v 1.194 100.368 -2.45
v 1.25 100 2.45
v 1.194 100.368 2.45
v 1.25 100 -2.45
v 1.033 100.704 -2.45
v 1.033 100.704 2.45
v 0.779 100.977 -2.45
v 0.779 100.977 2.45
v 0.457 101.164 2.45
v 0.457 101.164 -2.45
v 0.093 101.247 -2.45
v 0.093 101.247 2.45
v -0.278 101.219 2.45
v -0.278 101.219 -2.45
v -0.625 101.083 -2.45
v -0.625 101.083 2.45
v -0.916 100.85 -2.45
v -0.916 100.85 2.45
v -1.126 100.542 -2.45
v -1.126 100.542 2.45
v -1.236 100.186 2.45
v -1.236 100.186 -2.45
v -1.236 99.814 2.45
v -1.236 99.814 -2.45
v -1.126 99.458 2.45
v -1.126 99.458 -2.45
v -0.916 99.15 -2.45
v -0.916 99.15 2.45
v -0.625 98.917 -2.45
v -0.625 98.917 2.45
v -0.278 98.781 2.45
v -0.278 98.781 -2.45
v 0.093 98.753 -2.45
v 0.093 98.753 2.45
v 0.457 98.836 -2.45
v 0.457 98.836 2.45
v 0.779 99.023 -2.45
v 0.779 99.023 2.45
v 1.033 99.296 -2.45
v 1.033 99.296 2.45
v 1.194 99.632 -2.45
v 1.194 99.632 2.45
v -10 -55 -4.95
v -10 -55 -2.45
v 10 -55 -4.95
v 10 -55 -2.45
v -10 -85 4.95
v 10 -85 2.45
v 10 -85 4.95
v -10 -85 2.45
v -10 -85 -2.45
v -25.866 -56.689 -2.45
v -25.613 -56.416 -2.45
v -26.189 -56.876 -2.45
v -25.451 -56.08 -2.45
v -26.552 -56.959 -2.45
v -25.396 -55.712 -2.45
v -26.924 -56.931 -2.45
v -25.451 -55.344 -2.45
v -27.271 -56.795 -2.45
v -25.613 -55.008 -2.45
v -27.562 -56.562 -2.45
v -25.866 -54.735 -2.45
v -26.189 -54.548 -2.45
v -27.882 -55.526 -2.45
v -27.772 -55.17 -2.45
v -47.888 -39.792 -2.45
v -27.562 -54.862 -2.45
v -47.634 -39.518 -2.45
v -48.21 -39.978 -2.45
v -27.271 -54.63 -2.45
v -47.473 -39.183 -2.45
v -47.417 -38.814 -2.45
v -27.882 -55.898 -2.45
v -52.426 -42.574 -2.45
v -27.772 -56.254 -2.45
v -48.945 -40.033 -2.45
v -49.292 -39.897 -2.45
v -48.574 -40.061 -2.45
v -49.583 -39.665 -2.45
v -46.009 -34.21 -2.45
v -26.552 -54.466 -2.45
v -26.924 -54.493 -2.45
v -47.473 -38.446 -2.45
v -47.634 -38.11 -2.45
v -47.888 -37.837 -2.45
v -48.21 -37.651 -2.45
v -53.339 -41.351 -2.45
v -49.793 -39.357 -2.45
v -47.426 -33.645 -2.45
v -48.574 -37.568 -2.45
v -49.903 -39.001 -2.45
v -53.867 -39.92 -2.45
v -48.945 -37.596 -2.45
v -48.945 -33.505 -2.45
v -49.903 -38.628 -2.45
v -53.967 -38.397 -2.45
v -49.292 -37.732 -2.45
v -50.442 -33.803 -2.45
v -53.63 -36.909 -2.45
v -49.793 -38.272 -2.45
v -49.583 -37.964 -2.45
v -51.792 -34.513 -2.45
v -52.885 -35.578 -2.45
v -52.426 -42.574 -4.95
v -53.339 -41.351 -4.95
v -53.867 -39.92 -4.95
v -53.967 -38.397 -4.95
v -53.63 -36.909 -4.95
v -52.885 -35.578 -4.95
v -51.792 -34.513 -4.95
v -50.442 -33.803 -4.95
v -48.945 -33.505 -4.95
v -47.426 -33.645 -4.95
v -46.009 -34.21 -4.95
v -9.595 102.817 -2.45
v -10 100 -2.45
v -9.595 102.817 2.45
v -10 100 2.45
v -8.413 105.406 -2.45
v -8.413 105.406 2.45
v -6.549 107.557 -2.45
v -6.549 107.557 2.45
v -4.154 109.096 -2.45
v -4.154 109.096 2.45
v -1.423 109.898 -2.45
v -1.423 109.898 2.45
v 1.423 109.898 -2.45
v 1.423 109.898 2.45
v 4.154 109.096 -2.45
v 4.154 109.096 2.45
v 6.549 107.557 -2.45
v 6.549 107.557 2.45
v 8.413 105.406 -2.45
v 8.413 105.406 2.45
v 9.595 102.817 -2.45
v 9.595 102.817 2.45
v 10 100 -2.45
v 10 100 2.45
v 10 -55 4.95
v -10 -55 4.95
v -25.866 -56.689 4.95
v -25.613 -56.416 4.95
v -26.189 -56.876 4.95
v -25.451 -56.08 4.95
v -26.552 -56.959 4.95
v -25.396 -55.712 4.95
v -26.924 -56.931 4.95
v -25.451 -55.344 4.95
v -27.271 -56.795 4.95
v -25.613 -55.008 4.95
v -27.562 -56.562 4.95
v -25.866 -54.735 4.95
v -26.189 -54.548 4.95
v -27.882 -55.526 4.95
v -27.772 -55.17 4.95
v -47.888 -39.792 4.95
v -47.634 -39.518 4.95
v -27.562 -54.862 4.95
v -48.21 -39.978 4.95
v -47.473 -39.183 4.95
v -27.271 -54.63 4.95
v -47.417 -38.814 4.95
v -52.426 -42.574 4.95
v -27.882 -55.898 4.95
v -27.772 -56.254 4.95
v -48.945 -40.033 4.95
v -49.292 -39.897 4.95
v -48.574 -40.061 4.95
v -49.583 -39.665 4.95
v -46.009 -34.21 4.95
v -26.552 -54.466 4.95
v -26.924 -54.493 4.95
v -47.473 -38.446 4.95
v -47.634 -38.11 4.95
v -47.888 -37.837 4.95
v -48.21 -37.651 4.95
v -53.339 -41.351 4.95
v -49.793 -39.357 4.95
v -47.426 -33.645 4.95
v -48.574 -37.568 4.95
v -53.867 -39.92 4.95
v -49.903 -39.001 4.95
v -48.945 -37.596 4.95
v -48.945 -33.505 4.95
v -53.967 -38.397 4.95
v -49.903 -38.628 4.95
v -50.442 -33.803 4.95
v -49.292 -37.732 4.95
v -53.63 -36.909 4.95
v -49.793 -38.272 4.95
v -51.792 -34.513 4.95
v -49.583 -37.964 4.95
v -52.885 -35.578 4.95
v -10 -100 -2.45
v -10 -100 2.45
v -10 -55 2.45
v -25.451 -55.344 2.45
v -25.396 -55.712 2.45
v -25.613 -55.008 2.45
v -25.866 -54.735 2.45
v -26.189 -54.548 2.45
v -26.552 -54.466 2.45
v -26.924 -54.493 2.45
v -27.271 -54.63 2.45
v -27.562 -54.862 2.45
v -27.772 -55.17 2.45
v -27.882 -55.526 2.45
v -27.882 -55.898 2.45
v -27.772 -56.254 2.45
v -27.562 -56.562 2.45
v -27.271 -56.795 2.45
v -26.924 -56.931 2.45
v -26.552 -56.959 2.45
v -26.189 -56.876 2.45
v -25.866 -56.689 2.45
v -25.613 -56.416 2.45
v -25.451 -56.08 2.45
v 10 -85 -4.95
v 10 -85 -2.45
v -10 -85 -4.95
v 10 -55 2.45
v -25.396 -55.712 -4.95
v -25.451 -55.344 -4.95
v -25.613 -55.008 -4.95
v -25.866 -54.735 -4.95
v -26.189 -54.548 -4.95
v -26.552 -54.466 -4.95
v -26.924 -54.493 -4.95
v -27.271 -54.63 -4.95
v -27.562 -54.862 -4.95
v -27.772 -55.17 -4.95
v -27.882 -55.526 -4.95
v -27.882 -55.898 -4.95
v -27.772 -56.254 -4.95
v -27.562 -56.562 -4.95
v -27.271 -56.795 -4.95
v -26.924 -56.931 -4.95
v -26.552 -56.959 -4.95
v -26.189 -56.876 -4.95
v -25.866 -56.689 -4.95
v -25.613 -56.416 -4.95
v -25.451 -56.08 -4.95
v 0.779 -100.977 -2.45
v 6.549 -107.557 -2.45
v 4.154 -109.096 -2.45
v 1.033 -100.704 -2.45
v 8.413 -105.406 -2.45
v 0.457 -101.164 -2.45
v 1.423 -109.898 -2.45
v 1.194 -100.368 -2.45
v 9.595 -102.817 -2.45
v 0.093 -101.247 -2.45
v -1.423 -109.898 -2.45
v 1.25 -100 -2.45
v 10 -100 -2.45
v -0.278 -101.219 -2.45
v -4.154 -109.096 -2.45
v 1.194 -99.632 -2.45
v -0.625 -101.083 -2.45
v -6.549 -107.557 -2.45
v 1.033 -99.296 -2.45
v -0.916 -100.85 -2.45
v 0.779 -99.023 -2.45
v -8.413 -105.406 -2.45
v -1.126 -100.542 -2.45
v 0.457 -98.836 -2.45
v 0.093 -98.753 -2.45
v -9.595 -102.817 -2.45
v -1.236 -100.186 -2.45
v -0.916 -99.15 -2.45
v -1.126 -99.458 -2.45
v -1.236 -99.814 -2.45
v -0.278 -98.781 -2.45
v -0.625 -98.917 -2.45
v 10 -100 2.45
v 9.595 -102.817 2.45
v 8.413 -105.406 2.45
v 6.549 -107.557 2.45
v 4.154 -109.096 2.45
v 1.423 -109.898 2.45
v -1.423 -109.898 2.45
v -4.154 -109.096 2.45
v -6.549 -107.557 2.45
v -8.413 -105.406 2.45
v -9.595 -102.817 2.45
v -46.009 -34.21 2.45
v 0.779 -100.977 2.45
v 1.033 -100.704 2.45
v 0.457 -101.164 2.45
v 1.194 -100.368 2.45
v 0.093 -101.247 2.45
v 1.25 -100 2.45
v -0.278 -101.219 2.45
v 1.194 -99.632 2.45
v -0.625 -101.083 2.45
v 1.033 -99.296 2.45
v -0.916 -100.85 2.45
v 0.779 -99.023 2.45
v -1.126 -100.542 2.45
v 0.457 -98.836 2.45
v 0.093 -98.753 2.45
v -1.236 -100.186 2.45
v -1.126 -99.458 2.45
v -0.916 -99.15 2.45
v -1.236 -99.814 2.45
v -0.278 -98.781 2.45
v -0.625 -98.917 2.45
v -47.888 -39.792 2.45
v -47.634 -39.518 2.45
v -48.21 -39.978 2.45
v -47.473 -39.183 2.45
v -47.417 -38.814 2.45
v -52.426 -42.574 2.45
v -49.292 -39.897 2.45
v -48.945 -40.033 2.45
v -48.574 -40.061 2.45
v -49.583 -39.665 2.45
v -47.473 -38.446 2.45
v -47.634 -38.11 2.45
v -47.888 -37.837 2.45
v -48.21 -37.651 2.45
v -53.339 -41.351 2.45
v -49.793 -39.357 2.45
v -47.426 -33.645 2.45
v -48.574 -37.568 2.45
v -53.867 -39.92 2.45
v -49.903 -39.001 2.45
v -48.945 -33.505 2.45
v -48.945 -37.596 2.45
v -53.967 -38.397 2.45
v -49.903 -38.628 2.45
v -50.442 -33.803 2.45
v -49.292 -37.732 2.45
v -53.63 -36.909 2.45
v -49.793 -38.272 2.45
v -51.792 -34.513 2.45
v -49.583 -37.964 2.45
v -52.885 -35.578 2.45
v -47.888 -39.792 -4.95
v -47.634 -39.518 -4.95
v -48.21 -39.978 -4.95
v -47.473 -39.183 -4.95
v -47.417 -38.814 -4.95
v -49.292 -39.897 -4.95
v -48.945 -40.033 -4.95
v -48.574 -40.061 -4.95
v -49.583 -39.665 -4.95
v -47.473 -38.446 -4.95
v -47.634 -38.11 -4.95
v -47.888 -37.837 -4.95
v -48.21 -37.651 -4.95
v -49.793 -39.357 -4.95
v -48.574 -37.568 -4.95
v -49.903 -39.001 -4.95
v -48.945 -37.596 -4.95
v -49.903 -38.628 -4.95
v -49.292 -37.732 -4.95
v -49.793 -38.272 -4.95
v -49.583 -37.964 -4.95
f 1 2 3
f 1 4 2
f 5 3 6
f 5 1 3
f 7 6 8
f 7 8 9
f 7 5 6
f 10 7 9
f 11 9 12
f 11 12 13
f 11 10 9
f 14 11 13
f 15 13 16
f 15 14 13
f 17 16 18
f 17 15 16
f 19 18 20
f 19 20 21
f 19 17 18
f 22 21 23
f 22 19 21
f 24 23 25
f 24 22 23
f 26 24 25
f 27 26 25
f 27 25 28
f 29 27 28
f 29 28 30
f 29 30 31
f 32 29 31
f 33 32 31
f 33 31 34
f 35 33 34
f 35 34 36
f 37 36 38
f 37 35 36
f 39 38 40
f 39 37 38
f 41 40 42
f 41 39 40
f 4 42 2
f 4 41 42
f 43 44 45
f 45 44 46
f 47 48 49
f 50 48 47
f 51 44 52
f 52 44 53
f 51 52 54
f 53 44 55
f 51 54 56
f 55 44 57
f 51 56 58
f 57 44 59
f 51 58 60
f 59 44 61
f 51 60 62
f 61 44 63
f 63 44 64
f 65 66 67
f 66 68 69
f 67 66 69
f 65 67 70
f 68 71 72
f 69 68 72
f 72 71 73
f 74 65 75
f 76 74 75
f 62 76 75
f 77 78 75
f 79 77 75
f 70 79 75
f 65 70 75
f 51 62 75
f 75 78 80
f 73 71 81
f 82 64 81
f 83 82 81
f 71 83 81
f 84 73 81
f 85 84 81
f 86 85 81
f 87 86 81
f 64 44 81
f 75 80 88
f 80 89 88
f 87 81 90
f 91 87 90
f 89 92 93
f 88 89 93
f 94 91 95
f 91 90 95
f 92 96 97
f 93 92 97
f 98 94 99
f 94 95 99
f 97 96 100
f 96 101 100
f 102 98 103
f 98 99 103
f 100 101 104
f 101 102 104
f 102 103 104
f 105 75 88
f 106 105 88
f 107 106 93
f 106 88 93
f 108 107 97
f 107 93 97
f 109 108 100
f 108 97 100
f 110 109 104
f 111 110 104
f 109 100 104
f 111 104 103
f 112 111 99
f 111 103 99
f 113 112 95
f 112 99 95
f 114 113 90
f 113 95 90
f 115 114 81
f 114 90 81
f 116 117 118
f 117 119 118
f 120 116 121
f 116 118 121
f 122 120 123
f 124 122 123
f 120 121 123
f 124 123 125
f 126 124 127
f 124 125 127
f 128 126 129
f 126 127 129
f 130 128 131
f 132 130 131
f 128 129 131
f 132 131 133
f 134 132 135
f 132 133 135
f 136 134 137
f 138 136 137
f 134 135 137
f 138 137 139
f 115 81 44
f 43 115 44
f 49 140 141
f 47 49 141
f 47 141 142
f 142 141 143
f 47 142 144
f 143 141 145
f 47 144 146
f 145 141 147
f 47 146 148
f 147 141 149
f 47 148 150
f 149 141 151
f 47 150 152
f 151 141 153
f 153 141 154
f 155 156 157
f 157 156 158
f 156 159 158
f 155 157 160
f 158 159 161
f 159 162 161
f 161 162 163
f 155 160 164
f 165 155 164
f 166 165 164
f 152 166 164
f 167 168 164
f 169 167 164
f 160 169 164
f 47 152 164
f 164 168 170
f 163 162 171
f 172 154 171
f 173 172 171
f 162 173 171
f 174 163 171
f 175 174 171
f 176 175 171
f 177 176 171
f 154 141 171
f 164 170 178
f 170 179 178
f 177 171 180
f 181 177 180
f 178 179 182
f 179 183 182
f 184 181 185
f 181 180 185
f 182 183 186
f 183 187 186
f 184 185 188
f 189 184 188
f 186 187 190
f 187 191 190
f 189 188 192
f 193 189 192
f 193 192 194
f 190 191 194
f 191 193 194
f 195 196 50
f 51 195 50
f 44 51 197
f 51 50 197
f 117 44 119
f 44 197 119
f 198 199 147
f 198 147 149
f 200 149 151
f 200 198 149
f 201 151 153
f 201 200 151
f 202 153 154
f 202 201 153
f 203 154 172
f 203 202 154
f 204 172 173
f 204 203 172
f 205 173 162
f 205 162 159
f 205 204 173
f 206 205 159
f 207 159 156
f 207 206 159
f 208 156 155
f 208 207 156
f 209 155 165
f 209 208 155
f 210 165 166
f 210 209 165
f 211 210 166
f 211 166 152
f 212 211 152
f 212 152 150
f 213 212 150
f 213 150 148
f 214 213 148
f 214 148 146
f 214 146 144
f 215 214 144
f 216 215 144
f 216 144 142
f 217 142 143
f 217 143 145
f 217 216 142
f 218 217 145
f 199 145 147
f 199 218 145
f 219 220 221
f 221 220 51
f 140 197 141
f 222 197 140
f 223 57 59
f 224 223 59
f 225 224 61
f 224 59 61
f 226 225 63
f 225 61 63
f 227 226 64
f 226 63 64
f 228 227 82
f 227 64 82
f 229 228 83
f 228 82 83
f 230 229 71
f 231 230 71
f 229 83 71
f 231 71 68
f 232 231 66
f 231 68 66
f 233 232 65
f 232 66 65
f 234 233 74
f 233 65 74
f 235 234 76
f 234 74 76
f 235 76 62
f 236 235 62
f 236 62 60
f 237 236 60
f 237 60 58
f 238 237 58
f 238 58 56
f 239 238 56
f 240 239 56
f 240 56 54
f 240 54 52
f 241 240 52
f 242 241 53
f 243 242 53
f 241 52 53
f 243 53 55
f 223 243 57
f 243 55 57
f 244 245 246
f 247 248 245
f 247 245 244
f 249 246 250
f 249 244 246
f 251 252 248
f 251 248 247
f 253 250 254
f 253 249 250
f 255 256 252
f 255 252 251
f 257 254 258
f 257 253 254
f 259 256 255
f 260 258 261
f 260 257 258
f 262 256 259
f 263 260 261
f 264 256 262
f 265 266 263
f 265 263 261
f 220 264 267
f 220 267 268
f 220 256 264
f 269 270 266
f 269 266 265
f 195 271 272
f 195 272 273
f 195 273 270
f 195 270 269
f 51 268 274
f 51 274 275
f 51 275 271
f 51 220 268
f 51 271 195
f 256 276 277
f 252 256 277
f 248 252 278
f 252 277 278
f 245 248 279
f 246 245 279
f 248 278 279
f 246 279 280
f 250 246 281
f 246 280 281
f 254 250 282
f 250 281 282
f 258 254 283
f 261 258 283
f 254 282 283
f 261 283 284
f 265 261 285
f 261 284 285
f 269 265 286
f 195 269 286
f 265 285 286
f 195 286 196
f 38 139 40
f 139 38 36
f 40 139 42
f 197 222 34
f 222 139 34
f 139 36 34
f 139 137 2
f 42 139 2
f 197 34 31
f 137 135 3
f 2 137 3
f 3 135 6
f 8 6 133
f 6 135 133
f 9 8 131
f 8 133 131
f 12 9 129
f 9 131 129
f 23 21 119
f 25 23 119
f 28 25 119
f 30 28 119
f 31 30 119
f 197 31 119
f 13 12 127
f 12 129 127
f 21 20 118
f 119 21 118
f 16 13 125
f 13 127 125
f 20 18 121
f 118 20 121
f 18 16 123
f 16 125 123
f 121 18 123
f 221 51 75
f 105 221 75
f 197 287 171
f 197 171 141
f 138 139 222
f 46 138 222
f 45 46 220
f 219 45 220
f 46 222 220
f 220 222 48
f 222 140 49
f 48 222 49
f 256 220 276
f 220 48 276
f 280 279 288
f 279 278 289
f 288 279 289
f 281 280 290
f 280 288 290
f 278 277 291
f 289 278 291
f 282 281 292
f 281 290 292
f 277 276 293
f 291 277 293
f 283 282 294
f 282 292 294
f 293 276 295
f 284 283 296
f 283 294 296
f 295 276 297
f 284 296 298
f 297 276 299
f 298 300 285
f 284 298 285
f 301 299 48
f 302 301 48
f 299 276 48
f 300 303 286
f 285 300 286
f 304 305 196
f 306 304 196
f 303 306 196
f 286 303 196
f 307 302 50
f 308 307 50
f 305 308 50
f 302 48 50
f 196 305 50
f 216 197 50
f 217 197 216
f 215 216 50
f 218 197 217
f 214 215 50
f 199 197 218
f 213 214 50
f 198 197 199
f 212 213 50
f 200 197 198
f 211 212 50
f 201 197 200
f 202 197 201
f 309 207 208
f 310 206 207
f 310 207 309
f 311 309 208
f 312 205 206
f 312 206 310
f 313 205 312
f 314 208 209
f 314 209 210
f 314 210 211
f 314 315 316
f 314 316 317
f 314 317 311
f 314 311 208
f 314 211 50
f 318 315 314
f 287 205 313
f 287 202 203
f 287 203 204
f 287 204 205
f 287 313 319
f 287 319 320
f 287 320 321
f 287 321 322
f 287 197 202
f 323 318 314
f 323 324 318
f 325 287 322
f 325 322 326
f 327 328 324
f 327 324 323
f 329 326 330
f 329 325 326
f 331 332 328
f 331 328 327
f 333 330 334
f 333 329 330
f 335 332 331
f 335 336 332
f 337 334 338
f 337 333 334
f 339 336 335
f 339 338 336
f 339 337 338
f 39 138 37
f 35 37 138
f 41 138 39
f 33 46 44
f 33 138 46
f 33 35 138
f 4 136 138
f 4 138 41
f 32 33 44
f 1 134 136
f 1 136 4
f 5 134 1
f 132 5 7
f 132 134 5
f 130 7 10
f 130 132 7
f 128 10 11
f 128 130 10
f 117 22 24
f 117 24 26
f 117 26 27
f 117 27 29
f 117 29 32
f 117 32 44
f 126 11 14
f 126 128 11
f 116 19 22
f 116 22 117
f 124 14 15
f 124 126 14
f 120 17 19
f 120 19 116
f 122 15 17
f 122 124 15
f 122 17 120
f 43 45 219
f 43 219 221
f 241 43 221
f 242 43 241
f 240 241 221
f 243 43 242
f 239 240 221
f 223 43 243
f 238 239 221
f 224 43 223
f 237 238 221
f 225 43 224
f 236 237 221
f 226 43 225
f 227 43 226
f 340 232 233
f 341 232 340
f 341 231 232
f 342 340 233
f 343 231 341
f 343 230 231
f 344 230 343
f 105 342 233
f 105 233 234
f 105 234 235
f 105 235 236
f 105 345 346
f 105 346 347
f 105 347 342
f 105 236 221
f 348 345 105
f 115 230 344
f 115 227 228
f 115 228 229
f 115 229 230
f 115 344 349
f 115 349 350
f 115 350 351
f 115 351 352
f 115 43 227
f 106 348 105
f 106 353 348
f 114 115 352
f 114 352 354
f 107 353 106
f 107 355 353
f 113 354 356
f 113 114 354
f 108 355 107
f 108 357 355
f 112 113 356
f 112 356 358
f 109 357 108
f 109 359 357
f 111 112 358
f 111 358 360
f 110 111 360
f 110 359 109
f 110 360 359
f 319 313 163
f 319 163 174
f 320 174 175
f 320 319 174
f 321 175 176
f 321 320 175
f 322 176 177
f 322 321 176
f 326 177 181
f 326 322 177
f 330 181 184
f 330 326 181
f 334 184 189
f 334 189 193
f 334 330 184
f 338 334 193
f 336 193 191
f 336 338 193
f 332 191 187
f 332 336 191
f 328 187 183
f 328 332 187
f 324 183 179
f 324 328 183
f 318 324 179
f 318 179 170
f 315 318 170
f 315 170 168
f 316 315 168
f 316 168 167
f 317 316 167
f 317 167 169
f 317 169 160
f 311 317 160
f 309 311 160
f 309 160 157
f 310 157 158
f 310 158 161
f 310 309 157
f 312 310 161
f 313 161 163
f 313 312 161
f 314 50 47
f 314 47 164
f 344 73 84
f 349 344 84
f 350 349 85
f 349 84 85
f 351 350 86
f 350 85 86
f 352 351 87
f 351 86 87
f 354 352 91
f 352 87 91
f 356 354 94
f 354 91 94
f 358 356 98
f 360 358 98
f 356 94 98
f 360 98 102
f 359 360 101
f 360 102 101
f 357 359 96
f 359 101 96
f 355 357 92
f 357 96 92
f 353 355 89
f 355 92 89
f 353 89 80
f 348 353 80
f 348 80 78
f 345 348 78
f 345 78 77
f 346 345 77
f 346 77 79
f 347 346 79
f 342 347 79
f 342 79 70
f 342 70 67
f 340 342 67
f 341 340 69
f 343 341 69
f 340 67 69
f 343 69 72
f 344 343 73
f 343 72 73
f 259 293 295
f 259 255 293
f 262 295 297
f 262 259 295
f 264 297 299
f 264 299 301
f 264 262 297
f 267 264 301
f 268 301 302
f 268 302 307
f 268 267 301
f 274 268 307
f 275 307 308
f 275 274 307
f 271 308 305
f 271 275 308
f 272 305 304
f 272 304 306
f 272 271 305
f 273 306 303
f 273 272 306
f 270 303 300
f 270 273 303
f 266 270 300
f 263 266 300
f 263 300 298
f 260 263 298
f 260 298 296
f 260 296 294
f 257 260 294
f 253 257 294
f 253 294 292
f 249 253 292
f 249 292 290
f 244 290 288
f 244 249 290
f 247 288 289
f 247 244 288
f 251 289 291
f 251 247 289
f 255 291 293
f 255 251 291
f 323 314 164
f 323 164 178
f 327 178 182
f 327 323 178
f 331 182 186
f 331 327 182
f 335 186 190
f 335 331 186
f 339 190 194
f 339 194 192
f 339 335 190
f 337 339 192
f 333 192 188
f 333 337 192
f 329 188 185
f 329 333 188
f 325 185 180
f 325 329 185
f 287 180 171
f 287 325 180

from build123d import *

# Parameters (mm, degrees)
SKETCH1_R           = 1.25
BOSS_EXTRUDE2_DEPTH = 2.45
SKETCH4_R           = 1.25
BOSS_EXTRUDE4_DEPTH = 2.5


with BuildPart() as part:
    # Sketch1 → Boss-Extrude2 (new, symmetric)
    with BuildSketch(Plane.XY):
        with BuildLine():
            Line((-10, -100), (-10, 100))
            ThreePointArc((-10, 100), (0, 110), (10, 100))
            Line((10, 100), (10, -100))
            ThreePointArc((10, -100), (0, -110), (-10, -100))
        make_face()
        with Locations((0, 100)):
            Circle(SKETCH1_R, mode=Mode.SUBTRACT)
        with Locations((0, -100)):
            Circle(SKETCH1_R, mode=Mode.SUBTRACT)
    extrude(amount=BOSS_EXTRUDE2_DEPTH, both=True)

    # Sketch4 → Boss-Extrude4 (add)
    with BuildSketch(Plane.XY.offset(2.45)):
        with BuildLine():
            Line((-10, -85), (-52.426406871, -42.573593129))
            ThreePointArc((-52.426406871, -42.573593129), (-52.884926821, -35.577930556), (-46.008961975, -34.210216111))
            Line((-46.008961975, -34.210216111), (-10, -55))
            Line((-10, -55), (10, -55))
            Line((10, -55), (10, -85))
            Line((10, -85), (-10, -85))
        make_face()
        with Locations((-48.667154687, -38.814340944)):
            Circle(SKETCH4_R, mode=Mode.SUBTRACT)
        with Locations((-26.645631723, -55.712049831)):
            Circle(SKETCH4_R, mode=Mode.SUBTRACT)
    boss_extrude4 = extrude(amount=BOSS_EXTRUDE4_DEPTH)

    # Mirror1: Boss-Extrude4 across plane
    add(boss_extrude4.mirror(Plane.XY))


solid = part.part
